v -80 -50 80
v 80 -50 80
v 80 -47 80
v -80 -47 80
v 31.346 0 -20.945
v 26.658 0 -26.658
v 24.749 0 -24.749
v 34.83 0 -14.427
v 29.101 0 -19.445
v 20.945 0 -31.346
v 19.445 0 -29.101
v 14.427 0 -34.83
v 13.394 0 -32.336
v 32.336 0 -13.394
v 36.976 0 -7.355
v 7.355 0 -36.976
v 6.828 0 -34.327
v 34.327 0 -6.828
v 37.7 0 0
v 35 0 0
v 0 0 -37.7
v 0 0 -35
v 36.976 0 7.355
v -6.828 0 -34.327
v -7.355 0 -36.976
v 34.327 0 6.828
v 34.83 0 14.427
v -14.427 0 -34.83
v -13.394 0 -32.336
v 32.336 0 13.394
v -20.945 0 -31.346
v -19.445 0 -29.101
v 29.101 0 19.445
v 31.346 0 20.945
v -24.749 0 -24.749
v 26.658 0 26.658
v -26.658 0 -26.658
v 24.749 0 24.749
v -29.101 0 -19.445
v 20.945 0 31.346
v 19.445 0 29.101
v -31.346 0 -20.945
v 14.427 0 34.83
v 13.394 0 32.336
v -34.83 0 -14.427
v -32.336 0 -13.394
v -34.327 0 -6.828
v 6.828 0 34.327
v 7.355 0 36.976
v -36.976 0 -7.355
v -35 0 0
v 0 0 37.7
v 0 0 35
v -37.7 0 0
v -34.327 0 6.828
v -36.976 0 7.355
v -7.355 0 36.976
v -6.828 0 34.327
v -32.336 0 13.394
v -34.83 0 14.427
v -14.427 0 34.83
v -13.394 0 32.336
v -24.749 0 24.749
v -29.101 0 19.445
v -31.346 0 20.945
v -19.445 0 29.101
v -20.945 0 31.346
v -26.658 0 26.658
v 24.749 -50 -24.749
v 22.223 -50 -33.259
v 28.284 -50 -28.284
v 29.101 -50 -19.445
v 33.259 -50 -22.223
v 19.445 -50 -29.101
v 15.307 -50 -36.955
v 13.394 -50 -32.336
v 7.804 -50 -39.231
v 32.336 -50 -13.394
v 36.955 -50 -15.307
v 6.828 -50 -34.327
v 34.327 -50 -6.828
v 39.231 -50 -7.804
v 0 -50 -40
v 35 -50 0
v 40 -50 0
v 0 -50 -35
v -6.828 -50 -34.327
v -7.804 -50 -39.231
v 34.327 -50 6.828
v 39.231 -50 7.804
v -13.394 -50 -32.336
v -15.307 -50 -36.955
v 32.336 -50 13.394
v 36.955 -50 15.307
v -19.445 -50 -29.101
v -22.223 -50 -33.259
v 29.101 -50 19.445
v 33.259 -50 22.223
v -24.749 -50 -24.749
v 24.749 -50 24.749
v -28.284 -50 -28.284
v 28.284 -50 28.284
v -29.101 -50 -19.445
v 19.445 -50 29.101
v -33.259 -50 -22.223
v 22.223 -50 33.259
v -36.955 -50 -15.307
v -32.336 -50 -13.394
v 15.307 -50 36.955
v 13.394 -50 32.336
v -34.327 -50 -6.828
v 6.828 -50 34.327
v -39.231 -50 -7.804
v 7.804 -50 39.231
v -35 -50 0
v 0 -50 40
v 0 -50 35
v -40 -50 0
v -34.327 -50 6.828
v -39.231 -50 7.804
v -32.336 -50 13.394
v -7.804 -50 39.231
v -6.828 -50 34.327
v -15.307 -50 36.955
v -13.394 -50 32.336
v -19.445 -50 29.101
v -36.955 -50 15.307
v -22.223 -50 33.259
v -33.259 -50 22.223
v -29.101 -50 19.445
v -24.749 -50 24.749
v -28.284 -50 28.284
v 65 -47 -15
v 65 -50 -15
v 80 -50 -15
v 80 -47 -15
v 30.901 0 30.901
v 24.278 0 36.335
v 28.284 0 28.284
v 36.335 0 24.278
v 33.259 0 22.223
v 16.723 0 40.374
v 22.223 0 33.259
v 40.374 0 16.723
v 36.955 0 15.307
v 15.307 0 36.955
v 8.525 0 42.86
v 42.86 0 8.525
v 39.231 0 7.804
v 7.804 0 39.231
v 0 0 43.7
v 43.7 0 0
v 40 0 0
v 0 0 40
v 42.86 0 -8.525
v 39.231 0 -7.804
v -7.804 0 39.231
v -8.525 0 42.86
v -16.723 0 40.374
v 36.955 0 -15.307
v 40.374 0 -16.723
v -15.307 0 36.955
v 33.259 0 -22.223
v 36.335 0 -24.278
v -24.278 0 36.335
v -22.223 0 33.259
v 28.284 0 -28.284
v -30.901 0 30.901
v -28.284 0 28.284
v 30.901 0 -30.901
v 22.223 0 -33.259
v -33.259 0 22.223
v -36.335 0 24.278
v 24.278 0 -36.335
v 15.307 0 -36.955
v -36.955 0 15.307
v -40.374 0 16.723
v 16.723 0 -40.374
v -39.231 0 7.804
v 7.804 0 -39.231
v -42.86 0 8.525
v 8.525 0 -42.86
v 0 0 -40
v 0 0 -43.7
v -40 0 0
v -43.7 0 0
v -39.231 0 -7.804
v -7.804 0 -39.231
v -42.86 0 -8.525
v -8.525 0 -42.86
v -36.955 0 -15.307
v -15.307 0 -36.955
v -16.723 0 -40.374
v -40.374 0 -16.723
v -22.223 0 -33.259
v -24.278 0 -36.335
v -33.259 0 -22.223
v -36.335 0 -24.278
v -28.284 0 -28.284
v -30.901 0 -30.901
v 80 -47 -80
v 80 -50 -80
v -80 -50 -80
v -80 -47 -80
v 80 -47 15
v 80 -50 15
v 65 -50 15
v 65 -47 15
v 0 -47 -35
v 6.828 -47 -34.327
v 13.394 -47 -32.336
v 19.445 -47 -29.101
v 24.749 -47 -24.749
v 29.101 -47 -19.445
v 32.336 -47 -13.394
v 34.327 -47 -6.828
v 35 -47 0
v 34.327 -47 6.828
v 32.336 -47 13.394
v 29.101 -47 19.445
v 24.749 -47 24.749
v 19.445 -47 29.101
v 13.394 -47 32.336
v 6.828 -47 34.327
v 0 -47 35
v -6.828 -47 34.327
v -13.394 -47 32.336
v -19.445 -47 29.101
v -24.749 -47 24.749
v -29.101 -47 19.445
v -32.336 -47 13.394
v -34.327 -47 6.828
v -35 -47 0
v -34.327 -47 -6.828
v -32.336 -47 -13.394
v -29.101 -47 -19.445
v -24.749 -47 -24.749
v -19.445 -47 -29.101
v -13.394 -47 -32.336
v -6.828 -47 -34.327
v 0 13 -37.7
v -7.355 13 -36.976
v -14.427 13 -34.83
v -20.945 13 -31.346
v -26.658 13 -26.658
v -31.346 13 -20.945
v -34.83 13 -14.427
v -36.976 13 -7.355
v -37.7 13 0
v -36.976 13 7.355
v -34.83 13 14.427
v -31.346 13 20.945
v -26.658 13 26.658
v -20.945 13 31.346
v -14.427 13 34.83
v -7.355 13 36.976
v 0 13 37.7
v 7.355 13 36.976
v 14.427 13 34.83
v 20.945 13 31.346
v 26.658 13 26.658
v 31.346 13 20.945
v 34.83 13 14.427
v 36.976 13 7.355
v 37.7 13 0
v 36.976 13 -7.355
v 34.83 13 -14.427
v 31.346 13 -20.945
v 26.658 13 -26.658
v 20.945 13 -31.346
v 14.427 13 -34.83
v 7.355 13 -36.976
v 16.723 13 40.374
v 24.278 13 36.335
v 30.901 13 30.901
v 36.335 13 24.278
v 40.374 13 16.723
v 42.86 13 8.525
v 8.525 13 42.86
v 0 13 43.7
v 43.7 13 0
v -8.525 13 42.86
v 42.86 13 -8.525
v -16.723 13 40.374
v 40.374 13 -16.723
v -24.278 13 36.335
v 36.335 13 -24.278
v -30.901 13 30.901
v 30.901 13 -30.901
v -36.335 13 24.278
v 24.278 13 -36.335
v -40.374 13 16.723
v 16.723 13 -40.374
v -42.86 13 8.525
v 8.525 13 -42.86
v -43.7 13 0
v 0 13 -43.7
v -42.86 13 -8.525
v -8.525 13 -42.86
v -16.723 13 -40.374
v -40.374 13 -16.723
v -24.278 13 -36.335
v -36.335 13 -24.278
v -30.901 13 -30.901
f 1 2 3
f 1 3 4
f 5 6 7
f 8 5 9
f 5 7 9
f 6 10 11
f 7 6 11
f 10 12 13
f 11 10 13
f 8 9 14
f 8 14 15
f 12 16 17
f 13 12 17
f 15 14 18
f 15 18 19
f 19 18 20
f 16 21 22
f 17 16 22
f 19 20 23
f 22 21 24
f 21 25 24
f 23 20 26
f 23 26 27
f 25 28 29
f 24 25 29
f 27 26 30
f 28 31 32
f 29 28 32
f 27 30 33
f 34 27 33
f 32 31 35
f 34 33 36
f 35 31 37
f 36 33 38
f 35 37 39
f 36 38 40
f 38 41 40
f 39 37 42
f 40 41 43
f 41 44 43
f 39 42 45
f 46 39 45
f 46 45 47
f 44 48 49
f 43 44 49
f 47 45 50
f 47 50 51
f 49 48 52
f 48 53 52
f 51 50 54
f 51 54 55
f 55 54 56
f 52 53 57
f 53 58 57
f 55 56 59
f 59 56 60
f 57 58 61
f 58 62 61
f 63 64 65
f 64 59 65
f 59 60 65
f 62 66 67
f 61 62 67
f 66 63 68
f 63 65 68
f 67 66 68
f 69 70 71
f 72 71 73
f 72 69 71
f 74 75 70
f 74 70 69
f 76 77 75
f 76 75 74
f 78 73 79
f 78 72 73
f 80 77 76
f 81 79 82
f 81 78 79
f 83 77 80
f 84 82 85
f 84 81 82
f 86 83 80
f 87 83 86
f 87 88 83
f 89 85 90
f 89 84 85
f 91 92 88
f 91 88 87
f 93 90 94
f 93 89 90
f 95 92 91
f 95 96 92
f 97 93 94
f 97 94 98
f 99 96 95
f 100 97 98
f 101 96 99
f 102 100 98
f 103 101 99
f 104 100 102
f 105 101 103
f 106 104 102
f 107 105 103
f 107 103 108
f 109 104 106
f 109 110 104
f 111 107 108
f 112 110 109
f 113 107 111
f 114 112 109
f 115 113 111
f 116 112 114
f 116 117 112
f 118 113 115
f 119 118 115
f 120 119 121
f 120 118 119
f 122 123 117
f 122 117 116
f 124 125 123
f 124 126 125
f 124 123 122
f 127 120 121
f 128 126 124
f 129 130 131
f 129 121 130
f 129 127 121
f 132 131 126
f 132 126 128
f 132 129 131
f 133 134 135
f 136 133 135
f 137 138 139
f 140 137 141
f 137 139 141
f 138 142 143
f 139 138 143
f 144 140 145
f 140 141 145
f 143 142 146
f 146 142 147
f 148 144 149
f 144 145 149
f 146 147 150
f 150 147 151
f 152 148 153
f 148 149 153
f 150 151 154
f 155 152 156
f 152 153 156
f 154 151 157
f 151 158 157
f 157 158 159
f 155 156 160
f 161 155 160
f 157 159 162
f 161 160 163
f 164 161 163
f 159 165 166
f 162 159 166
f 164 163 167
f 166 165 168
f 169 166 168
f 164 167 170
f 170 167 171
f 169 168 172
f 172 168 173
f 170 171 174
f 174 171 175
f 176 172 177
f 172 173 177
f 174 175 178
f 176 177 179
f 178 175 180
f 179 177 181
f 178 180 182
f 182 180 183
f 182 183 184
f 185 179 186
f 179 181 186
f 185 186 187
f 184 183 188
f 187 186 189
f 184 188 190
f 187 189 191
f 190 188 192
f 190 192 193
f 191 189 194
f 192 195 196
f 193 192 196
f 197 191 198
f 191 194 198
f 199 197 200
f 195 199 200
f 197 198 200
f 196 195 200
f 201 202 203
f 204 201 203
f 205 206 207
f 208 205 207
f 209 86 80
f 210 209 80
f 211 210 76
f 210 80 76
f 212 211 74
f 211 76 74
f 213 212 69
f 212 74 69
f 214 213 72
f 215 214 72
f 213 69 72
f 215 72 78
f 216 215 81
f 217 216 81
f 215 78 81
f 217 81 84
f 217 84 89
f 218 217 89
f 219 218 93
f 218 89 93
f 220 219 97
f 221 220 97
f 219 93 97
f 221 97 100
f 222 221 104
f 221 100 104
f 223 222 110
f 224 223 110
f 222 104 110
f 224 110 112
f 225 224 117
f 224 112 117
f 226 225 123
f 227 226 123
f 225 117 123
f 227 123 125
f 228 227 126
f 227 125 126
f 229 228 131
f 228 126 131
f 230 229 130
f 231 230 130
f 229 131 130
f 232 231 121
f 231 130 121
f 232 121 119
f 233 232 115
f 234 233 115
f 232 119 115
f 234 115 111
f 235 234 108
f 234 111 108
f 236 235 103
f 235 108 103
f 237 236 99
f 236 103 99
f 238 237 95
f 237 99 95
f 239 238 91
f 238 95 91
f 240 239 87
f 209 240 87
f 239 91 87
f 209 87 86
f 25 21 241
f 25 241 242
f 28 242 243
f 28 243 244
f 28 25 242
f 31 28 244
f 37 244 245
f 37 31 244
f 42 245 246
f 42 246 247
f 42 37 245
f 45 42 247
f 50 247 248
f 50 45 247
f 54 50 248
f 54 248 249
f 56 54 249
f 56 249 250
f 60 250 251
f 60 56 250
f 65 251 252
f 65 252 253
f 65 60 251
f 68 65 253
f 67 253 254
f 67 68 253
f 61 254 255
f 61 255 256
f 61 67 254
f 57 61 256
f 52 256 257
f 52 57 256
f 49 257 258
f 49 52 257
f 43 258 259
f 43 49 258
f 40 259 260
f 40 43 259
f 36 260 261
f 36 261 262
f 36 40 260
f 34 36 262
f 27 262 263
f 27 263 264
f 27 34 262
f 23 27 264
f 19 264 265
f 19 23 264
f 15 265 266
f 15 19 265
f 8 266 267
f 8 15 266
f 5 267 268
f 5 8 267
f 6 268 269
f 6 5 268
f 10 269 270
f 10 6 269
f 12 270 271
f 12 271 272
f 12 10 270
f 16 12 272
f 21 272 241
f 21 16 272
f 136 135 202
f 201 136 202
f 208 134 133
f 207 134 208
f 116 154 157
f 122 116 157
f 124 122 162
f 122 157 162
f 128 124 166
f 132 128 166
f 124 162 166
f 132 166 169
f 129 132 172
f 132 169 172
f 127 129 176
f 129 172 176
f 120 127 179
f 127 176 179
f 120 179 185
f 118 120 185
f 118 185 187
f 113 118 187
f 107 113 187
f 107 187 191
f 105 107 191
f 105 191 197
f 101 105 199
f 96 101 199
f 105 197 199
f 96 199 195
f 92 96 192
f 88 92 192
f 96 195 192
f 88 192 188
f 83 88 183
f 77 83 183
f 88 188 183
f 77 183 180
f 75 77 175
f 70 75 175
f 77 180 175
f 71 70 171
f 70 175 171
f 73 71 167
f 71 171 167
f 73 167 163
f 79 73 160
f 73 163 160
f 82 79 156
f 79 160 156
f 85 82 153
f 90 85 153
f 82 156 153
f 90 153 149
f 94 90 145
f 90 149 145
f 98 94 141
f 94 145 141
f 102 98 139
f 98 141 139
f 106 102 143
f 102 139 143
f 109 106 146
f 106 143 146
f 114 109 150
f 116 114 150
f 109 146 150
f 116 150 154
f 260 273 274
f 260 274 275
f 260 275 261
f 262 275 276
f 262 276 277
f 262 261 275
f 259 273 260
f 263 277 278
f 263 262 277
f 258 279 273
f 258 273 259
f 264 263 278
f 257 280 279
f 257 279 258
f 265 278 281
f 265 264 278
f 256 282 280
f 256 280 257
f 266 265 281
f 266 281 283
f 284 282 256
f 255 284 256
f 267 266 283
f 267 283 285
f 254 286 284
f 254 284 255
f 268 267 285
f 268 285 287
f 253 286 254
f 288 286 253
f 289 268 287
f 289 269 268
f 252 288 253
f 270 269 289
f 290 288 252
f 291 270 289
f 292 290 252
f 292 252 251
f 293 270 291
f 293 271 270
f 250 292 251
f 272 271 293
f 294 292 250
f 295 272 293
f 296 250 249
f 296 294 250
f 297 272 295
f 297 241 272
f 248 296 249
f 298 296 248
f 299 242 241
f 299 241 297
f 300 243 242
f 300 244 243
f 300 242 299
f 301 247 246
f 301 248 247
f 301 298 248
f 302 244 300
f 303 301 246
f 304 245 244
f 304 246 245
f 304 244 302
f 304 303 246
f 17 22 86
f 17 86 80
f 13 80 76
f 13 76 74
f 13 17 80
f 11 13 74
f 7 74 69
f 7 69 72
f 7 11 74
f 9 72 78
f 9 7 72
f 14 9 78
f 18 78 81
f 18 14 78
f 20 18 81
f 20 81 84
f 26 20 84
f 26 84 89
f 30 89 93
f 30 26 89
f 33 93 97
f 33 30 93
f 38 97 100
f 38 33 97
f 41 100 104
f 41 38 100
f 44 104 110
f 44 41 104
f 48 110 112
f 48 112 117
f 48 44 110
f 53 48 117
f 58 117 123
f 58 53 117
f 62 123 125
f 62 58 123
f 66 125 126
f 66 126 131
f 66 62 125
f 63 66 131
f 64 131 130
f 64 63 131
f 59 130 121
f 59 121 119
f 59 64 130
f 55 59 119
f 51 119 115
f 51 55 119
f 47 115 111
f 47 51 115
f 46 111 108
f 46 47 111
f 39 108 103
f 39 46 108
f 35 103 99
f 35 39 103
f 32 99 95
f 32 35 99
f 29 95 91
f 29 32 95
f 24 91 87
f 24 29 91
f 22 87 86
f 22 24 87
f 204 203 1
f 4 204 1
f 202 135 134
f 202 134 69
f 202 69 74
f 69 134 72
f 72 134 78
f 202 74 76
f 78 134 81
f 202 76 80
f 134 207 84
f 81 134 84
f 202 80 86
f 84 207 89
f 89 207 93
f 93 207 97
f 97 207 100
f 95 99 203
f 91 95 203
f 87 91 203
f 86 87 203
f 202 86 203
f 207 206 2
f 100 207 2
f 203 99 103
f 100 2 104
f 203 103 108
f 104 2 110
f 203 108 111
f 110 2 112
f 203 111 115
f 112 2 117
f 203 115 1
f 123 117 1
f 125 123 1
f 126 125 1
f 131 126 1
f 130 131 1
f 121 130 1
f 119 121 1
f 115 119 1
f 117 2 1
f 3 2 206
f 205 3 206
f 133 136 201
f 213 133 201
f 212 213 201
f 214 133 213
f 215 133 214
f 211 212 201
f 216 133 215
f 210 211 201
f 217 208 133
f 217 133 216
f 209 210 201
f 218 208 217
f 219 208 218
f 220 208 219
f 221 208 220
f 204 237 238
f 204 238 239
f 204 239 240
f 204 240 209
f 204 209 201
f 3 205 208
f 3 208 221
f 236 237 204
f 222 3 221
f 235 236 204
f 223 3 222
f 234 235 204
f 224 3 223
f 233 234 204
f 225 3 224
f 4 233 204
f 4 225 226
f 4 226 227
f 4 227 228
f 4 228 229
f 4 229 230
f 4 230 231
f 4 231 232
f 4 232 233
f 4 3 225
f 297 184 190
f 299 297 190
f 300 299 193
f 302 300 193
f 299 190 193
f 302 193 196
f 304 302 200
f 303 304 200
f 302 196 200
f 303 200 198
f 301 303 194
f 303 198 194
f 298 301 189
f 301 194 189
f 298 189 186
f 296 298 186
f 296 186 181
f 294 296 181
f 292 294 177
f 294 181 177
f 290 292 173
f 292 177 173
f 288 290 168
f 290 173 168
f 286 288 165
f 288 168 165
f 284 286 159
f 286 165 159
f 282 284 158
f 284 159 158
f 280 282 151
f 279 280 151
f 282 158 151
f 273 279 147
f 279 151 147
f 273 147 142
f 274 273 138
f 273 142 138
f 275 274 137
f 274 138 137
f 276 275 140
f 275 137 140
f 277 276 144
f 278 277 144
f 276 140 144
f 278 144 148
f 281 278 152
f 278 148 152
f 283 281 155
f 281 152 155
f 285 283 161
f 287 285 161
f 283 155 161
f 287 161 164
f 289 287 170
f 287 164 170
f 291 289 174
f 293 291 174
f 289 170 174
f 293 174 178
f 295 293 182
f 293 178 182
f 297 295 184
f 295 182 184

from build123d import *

# Parameters (mm, degrees)
CROQUIS1_R              = 43.7
CROQUIS1_R_2            = 37.7
SALIENTE_EXTRUIR1_DEPTH = 13
CROQUIS2_R              = 40
CROQUIS2_R_2            = 35
SALIENTE_EXTRUIR2_DEPTH = 50
CROQUIS3_R              = 35
SALIENTE_EXTRUIR3_DEPTH = 3


with BuildPart() as part:
    # Croquis1 → Saliente-Extruir1 (new body)
    with BuildSketch(Plane(origin=(0, 0, 0), x_dir=(1, 0, 0), z_dir=(0, 1, 0))):
        with Locations(Location((0, 0, 0), (0, 0, 90))):
            Circle(CROQUIS1_R)
        with Locations(Location((0, 0, 0), (0, 0, 90))):
            Circle(CROQUIS1_R_2, mode=Mode.SUBTRACT)
    extrude(amount=SALIENTE_EXTRUIR1_DEPTH)

    # Croquis2 → Saliente-Extruir2 (add)
    with BuildSketch(Plane.XZ):
        with Locations(Location((0, 0, 0), (0, 0, 90))):
            Circle(CROQUIS2_R)
        with Locations(Location((0, 0, 0), (0, 0, 270))):
            Circle(CROQUIS2_R_2, mode=Mode.SUBTRACT)
    extrude(amount=SALIENTE_EXTRUIR2_DEPTH)


with BuildPart() as body_2:
    # Croquis3 → Saliente-Extruir3 (new body)
    with BuildSketch(Plane.XZ.offset(50)):
        Polygon((0, 80), (80, 80), (80, 15), (65, 15), (65, 0), (65, -15), (80, -15), (80, -80), (-80, -80), (-80, 80), align=None)
        with Locations(Location((0, 0, 0), (0, 0, 270))):
            Circle(CROQUIS3_R, mode=Mode.SUBTRACT)
    extrude(amount=-SALIENTE_EXTRUIR3_DEPTH)


solid = Compound([part.part, body_2.part])
